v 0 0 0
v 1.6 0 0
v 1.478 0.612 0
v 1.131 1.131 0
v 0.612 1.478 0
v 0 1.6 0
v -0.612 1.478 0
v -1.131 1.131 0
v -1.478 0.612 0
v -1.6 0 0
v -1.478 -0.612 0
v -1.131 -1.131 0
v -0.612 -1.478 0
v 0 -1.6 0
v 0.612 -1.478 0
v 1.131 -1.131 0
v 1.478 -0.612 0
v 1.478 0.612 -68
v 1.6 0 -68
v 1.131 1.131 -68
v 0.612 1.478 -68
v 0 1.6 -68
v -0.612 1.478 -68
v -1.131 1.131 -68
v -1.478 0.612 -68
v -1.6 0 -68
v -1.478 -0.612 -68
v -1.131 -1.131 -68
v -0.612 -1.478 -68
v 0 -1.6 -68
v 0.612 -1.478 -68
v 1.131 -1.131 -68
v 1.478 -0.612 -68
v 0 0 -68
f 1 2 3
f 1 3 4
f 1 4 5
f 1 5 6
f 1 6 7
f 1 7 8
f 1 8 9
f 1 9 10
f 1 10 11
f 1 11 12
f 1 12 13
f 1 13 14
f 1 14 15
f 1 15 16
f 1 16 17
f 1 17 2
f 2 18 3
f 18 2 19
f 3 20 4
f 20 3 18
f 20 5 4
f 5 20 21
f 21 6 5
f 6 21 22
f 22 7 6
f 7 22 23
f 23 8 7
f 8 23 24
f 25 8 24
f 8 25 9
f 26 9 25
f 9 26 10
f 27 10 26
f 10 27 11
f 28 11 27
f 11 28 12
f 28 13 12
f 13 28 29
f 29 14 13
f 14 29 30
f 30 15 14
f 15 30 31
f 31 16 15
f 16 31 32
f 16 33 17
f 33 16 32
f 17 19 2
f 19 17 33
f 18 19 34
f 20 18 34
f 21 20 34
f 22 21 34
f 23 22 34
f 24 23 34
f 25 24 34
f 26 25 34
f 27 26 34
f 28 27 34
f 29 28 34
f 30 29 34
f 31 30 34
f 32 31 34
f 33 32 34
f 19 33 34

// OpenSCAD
// file: ../p/4-4edge.scad
use <../lib.scad>
function ldraw_lib__4_4edge() = [
// 0 Circle 1.0
// 0 Name: 4-4edge.dat
// 0 Author: James Jessiman
// 0 !LDRAW_ORG Primitive UPDATE 2017-01
// 0 !LICENSE Licensed under CC BY 2.0 and CC BY 4.0 : see CAreadme.txt
// 
// 0 BFC CERTIFY CCW
  [0,"BFC","CERTIFY"],
  [0,"BFC","CCW"],
// 
// 0 !HISTORY 1998-12-15 [PTadmin] Official Update 1998-10
// 0 !HISTORY 2005-12-28 [PTadmin] Official Update 2005-01
// 0 !HISTORY 2007-06-24 [PTadmin] Header formatted for Contributor Agreement
// 0 !HISTORY 2008-07-01 [PTadmin] Official Update 2008-01
// 0 !HISTORY 2017-01-15 [Steffen] BFCed
// 0 !HISTORY 2017-12-30 [PTadmin] Official Update 2017-01
// 
// 
// 2 24 1 0 0 0.9239 0 0.3827
  [2,24,1,0,0,0.9239,0,0.3827],
// 2 24 0.9239 0 0.3827 0.7071 0 0.7071
  [2,24,0.9239,0,0.3827,0.7071,0,0.7071],
// 2 24 0.7071 0 0.7071 0.3827 0 0.9239
  [2,24,0.7071,0,0.7071,0.3827,0,0.9239],
// 2 24 0.3827 0 0.9239 0 0 1
  [2,24,0.3827,0,0.9239,0,0,1],
// 2 24 0 0 1 -0.3827 0 0.9239
  [2,24,0,0,1,-0.3827,0,0.9239],
// 2 24 -0.3827 0 0.9239 -0.7071 0 0.7071
  [2,24,-0.3827,0,0.9239,-0.7071,0,0.7071],
// 2 24 -0.7071 0 0.7071 -0.9239 0 0.3827
  [2,24,-0.7071,0,0.7071,-0.9239,0,0.3827],
// 2 24 -0.9239 0 0.3827 -1 0 -0
  [2,24,-0.9239,0,0.3827,-1,0,-0],
// 2 24 -1 0 -0 -0.9239 0 -0.3827
  [2,24,-1,0,-0,-0.9239,0,-0.3827],
// 2 24 -0.9239 0 -0.3827 -0.7071 0 -0.7071
  [2,24,-0.9239,0,-0.3827,-0.7071,0,-0.7071],
// 2 24 -0.7071 0 -0.7071 -0.3827 0 -0.9239
  [2,24,-0.7071,0,-0.7071,-0.3827,0,-0.9239],
// 2 24 -0.3827 0 -0.9239 0 0 -1
  [2,24,-0.3827,0,-0.9239,0,0,-1],
// 2 24 0 0 -1 0.3827 0 -0.9239
  [2,24,0,0,-1,0.3827,0,-0.9239],
// 2 24 0.3827 0 -0.9239 0.7071 0 -0.7071
  [2,24,0.3827,0,-0.9239,0.7071,0,-0.7071],
// 2 24 0.7071 0 -0.7071 0.9239 0 -0.3827
  [2,24,0.7071,0,-0.7071,0.9239,0,-0.3827],
// 2 24 0.9239 0 -0.3827 1 0 0
  [2,24,0.9239,0,-0.3827,1,0,0],
];
module ldraw_lib__4_4edge(step=0, col=false, unit=2/5, alt=false, line=0.2, solid=!$preview)
    makepoly(ldraw_lib__4_4edge(), step=step, col=col, unit=unit, alt=alt, line=line, solid=solid);
ldraw_lib__4_4edge(line=0.2);
// file: ../p/4-4cyli.scad
use <../lib.scad>
function ldraw_lib__4_4cyli() = [
// 0 Cylinder 1.0
// 0 Name: 4-4cyli.dat
// 0 Author: James Jessiman
// 0 !LDRAW_ORG Primitive UPDATE 2005-01
// 0 !LICENSE Licensed under CC BY 2.0 and CC BY 4.0 : see CAreadme.txt
// 
// 0 BFC CERTIFY CCW
  [0,"BFC","CERTIFY"],
  [0,"BFC","CCW"],
// 
// 0 !HISTORY 1998-12-15 [PTadmin] Official Update 1998-10
// 0 !HISTORY 2002-03-23 [sbliss] Added BFC statement; merged headers from files in distributions LDraw 0.27 and Complete.
// 0 !HISTORY 2002-04-25 [PTadmin] Official Update 2002-02
// 0 !HISTORY 2004-12-14 [guyvivan] BFC CCW
// 0 !HISTORY 2005-12-28 [PTadmin] Official Update 2005-01
// 0 !HISTORY 2007-06-24 [PTadmin] Header formatted for Contributor Agreement
// 0 !HISTORY 2008-07-01 [PTadmin] Official Update 2008-01
// 
// 
// 4 16 1 1 0 0.9239 1 0.3827 0.9239 0 0.3827 1 0 0
  [4,16,1,1,0,0.9239,1,0.3827,0.9239,0,0.3827,1,0,0],
// 5 24 1 0 0 1 1 0 0.9239 0 0.3827 0.9239 0 -0.3827
  [5,24,1,0,0,1,1,0,0.9239,0,0.3827,0.9239,0,-0.3827],
// 4 16 0.9239 1 0.3827 0.7071 1 0.7071 0.7071 0 0.7071 0.9239 0 0.3827
  [4,16,0.9239,1,0.3827,0.7071,1,0.7071,0.7071,0,0.7071,0.9239,0,0.3827],
// 5 24 0.9239 0 0.3827 0.9239 1 0.3827 0.7071 0 0.7071 1 0 0
  [5,24,0.9239,0,0.3827,0.9239,1,0.3827,0.7071,0,0.7071,1,0,0],
// 4 16 0.7071 1 0.7071 0.3827 1 0.9239 0.3827 0 0.9239 0.7071 0 0.7071
  [4,16,0.7071,1,0.7071,0.3827,1,0.9239,0.3827,0,0.9239,0.7071,0,0.7071],
// 5 24 0.7071 0 0.7071 0.7071 1 0.7071 0.3827 0 0.9239 0.9239 0 0.3827
  [5,24,0.7071,0,0.7071,0.7071,1,0.7071,0.3827,0,0.9239,0.9239,0,0.3827],
// 4 16 0.3827 1 0.9239 0 1 1 0 0 1 0.3827 0 0.9239
  [4,16,0.3827,1,0.9239,0,1,1,0,0,1,0.3827,0,0.9239],
// 5 24 0.3827 0 0.9239 0.3827 1 0.9239 0 0 1 0.7071 0 0.7071
  [5,24,0.3827,0,0.9239,0.3827,1,0.9239,0,0,1,0.7071,0,0.7071],
// 4 16 0 1 1 -0.3827 1 0.9239 -0.3827 0 0.9239 0 0 1
  [4,16,0,1,1,-0.3827,1,0.9239,-0.3827,0,0.9239,0,0,1],
// 5 24 0 0 1 0 1 1 -0.3827 0 0.9239 0.3827 0 0.9239
  [5,24,0,0,1,0,1,1,-0.3827,0,0.9239,0.3827,0,0.9239],
// 4 16 -0.3827 1 0.9239 -0.7071 1 0.7071 -0.7071 0 0.7071 -0.3827 0 0.9239
  [4,16,-0.3827,1,0.9239,-0.7071,1,0.7071,-0.7071,0,0.7071,-0.3827,0,0.9239],
// 5 24 -0.3827 0 0.9239 -0.3827 1 0.9239 -0.7071 0 0.7071 0 0 1
  [5,24,-0.3827,0,0.9239,-0.3827,1,0.9239,-0.7071,0,0.7071,0,0,1],
// 4 16 -0.7071 1 0.7071 -0.9239 1 0.3827 -0.9239 0 0.3827 -0.7071 0 0.7071
  [4,16,-0.7071,1,0.7071,-0.9239,1,0.3827,-0.9239,0,0.3827,-0.7071,0,0.7071],
// 5 24 -0.7071 0 0.7071 -0.7071 1 0.7071 -0.9239 0 0.3827 -0.3827 0 0.9239
  [5,24,-0.7071,0,0.7071,-0.7071,1,0.7071,-0.9239,0,0.3827,-0.3827,0,0.9239],
// 4 16 -0.9239 1 0.3827 -1 1 0 -1 0 0 -0.9239 0 0.3827
  [4,16,-0.9239,1,0.3827,-1,1,0,-1,0,0,-0.9239,0,0.3827],
// 5 24 -0.9239 0 0.3827 -0.9239 1 0.3827 -1 0 0 -0.7071 0 0.7071
  [5,24,-0.9239,0,0.3827,-0.9239,1,0.3827,-1,0,0,-0.7071,0,0.7071],
// 4 16 -1 1 0 -0.9239 1 -0.3827 -0.9239 0 -0.3827 -1 0 0
  [4,16,-1,1,0,-0.9239,1,-0.3827,-0.9239,0,-0.3827,-1,0,0],
// 5 24 -1 0 0 -1 1 0 -0.9239 0 -0.3827 -0.9239 0 0.3827
  [5,24,-1,0,0,-1,1,0,-0.9239,0,-0.3827,-0.9239,0,0.3827],
// 4 16 -0.9239 1 -0.3827 -0.7071 1 -0.7071 -0.7071 0 -0.7071 -0.9239 0 -0.3827
  [4,16,-0.9239,1,-0.3827,-0.7071,1,-0.7071,-0.7071,0,-0.7071,-0.9239,0,-0.3827],
// 5 24 -0.9239 0 -0.3827 -0.9239 1 -0.3827 -0.7071 0 -0.7071 -1 0 0
  [5,24,-0.9239,0,-0.3827,-0.9239,1,-0.3827,-0.7071,0,-0.7071,-1,0,0],
// 4 16 -0.7071 1 -0.7071 -0.3827 1 -0.9239 -0.3827 0 -0.9239 -0.7071 0 -0.7071
  [4,16,-0.7071,1,-0.7071,-0.3827,1,-0.9239,-0.3827,0,-0.9239,-0.7071,0,-0.7071],
// 5 24 -0.7071 0 -0.7071 -0.7071 1 -0.7071 -0.3827 0 -0.9239 -0.9239 0 -0.3827
  [5,24,-0.7071,0,-0.7071,-0.7071,1,-0.7071,-0.3827,0,-0.9239,-0.9239,0,-0.3827],
// 4 16 -0.3827 1 -0.9239 0 1 -1 0 0 -1 -0.3827 0 -0.9239
  [4,16,-0.3827,1,-0.9239,0,1,-1,0,0,-1,-0.3827,0,-0.9239],
// 5 24 -0.3827 0 -0.9239 -0.3827 1 -0.9239 0 0 -1 -0.7071 0 -0.7071
  [5,24,-0.3827,0,-0.9239,-0.3827,1,-0.9239,0,0,-1,-0.7071,0,-0.7071],
// 4 16 0 1 -1 0.3827 1 -0.9239 0.3827 0 -0.9239 0 0 -1
  [4,16,0,1,-1,0.3827,1,-0.9239,0.3827,0,-0.9239,0,0,-1],
// 5 24 0 0 -1 0 1 -1 0.3827 0 -0.9239 -0.3827 0 -0.9239
  [5,24,0,0,-1,0,1,-1,0.3827,0,-0.9239,-0.3827,0,-0.9239],
// 4 16 0.3827 1 -0.9239 0.7071 1 -0.7071 0.7071 0 -0.7071 0.3827 0 -0.9239
  [4,16,0.3827,1,-0.9239,0.7071,1,-0.7071,0.7071,0,-0.7071,0.3827,0,-0.9239],
// 5 24 0.3827 0 -0.9239 0.3827 1 -0.9239 0.7071 0 -0.7071 0 0 -1
  [5,24,0.3827,0,-0.9239,0.3827,1,-0.9239,0.7071,0,-0.7071,0,0,-1],
// 4 16 0.7071 1 -0.7071 0.9239 1 -0.3827 0.9239 0 -0.3827 0.7071 0 -0.7071
  [4,16,0.7071,1,-0.7071,0.9239,1,-0.3827,0.9239,0,-0.3827,0.7071,0,-0.7071],
// 5 24 0.7071 0 -0.7071 0.7071 1 -0.7071 0.9239 0 -0.3827 0.3827 0 -0.9239
  [5,24,0.7071,0,-0.7071,0.7071,1,-0.7071,0.9239,0,-0.3827,0.3827,0,-0.9239],
// 4 16 0.9239 1 -0.3827 1 1 0 1 0 0 0.9239 0 -0.3827
  [4,16,0.9239,1,-0.3827,1,1,0,1,0,0,0.9239,0,-0.3827],
// 5 24 0.9239 0 -0.3827 0.9239 1 -0.3827 1 0 0 0.7071 0 -0.7071
  [5,24,0.9239,0,-0.3827,0.9239,1,-0.3827,1,0,0,0.7071,0,-0.7071],
// 0
];
module ldraw_lib__4_4cyli(step=0, col=false, unit=2/5, alt=false, line=0.2, solid=!$preview)
    makepoly(ldraw_lib__4_4cyli(), step=step, col=col, unit=unit, alt=alt, line=line, solid=solid);
ldraw_lib__4_4cyli(line=0.2);
// file: ../p/4-4disc.scad
use <../lib.scad>
function ldraw_lib__4_4disc() = [
// 0 Disc 1.0
// 0 Name: 4-4disc.dat
// 0 Author: James Jessiman
// 0 !LDRAW_ORG Primitive UPDATE 2002-02
// 0 !LICENSE Licensed under CC BY 2.0 and CC BY 4.0 : see CAreadme.txt
// 
// 0 BFC CERTIFY CCW
  [0,"BFC","CERTIFY"],
  [0,"BFC","CCW"],
// 
// 0 !HISTORY 1998-12-15 [PTadmin] Official Update 1998-10
// 0 !HISTORY 2002-03-23 [sbliss] Added BFC statement
// 0 !HISTORY 2002-04-25 [PTadmin] Official Update 2002-02
// 0 !HISTORY 2007-06-24 [PTadmin] Header formatted for Contributor Agreement
// 0 !HISTORY 2008-07-01 [PTadmin] Official Update 2008-01
// 
// 
// 3 16 0 0 0 1 0 0 0.9239 0 0.3827
  [3,16,0,0,0,1,0,0,0.9239,0,0.3827],
// 3 16 0 0 0 0.9239 0 0.3827 0.7071 0 0.7071
  [3,16,0,0,0,0.9239,0,0.3827,0.7071,0,0.7071],
// 3 16 0 0 0 0.7071 0 0.7071 0.3827 0 0.9239
  [3,16,0,0,0,0.7071,0,0.7071,0.3827,0,0.9239],
// 3 16 0 0 0 0.3827 0 0.9239 0 0 1
  [3,16,0,0,0,0.3827,0,0.9239,0,0,1],
// 3 16 0 0 0 0 0 1 -0.3827 0 0.9239
  [3,16,0,0,0,0,0,1,-0.3827,0,0.9239],
// 3 16 0 0 0 -0.3827 0 0.9239 -0.7071 0 0.7071
  [3,16,0,0,0,-0.3827,0,0.9239,-0.7071,0,0.7071],
// 3 16 0 0 0 -0.7071 0 0.7071 -0.9239 0 0.3827
  [3,16,0,0,0,-0.7071,0,0.7071,-0.9239,0,0.3827],
// 3 16 0 0 0 -0.9239 0 0.3827 -1 0 -0
  [3,16,0,0,0,-0.9239,0,0.3827,-1,0,-0],
// 3 16 0 0 0 -1 0 -0 -0.9239 0 -0.3827
  [3,16,0,0,0,-1,0,-0,-0.9239,0,-0.3827],
// 3 16 0 0 0 -0.9239 0 -0.3827 -0.7071 0 -0.7071
  [3,16,0,0,0,-0.9239,0,-0.3827,-0.7071,0,-0.7071],
// 3 16 0 0 0 -0.7071 0 -0.7071 -0.3827 0 -0.9239
  [3,16,0,0,0,-0.7071,0,-0.7071,-0.3827,0,-0.9239],
// 3 16 0 0 0 -0.3827 0 -0.9239 0 0 -1
  [3,16,0,0,0,-0.3827,0,-0.9239,0,0,-1],
// 3 16 0 0 0 0 0 -1 0.3827 0 -0.9239
  [3,16,0,0,0,0,0,-1,0.3827,0,-0.9239],
// 3 16 0 0 0 0.3827 0 -0.9239 0.7071 0 -0.7071
  [3,16,0,0,0,0.3827,0,-0.9239,0.7071,0,-0.7071],
// 3 16 0 0 0 0.7071 0 -0.7071 0.9239 0 -0.3827
  [3,16,0,0,0,0.7071,0,-0.7071,0.9239,0,-0.3827],
// 3 16 0 0 0 0.9239 0 -0.3827 1 0 0
  [3,16,0,0,0,0.9239,0,-0.3827,1,0,0],
// 0
];
module ldraw_lib__4_4disc(step=0, col=false, unit=2/5, alt=false, line=0.2, solid=!$preview)
    makepoly(ldraw_lib__4_4disc(), step=step, col=col, unit=unit, alt=alt, line=line, solid=solid);
ldraw_lib__4_4disc(line=0.2);
// file: ../p/4-4cylc.scad
use <../lib.scad>
use <4-4cyli.scad>
use <4-4disc.scad>
use <4-4edge.scad>
function ldraw_lib__4_4cylc() = [
// 0 Cylinder Closed 1.0
// 0 Name: 4-4cylc.dat
// 0 Author: Alex Taylor [anathema]
// 0 !LDRAW_ORG Primitive UPDATE 2009-02
// 0 !LICENSE Licensed under CC BY 2.0 and CC BY 4.0 : see CAreadme.txt
// 
// 0 BFC CERTIFY CCW
  [0,"BFC","CERTIFY"],
  [0,"BFC","CCW"],
// 
// 0 !HISTORY 2008-12-29 [cwdee] Removed one disc
// 0 !HISTORY 2009-09-03 [PTadmin] Official Update 2009-02
// 
// 
// 1 16 0 0 0 1 0 0 0 1 0 0 0 1 4-4edge.dat
  [1,16,0,0,0,1,0,0,0,1,0,0,0,1, ldraw_lib__4_4edge()],
// 1 16 0 1 0 1 0 0 0 1 0 0 0 1 4-4edge.dat
  [1,16,0,1,0,1,0,0,0,1,0,0,0,1, ldraw_lib__4_4edge()],
// 1 16 0 0 0 1 0 0 0 1 0 0 0 1 4-4disc.dat
  [1,16,0,0,0,1,0,0,0,1,0,0,0,1, ldraw_lib__4_4disc()],
// 1 16 0 0 0 1 0 0 0 1 0 0 0 1 4-4cyli.dat
  [1,16,0,0,0,1,0,0,0,1,0,0,0,1, ldraw_lib__4_4cyli()],
// 0
];
module ldraw_lib__4_4cylc(step=0, col=false, unit=2/5, alt=false, line=0.2, solid=!$preview)
    makepoly(ldraw_lib__4_4cylc(), step=step, col=col, unit=unit, alt=alt, line=line, solid=solid);
ldraw_lib__4_4cylc(line=0.2);
// main file
use <../lib.scad>
use <../p/4-4cylc.scad>
use <../p/4-4disc.scad>
function ldraw_lib__u9112() = [
// 0 ~Technic Pneumatic Cylinder  1 x 11 Piston Rod
// 0 Name: u9112.dat
// 0 Author: Philippe Hurbain [Philo]
// 0 !LDRAW_ORG Part UPDATE 2018-01
// 0 !LICENSE Licensed under CC BY 2.0 and CC BY 4.0 : see CAreadme.txt
// 
// 0 BFC CERTIFY CCW
  [0,"BFC","CERTIFY"],
  [0,"BFC","CCW"],
// 
// 0 !HISTORY 2018-01-30 [PTadmin] Official Update 2018-01
// 
// 
// 1 16 0 0 0 4 0 0 0 170 0 0 0 4 4-4cylc.dat
  [1,16,0,0,0,4,0,0,0,170,0,0,0,4, ldraw_lib__4_4cylc()],
// 1 16 0 170 0 4 0 0 0 -1 0 0 0 4 4-4disc.dat
  [1,16,0,170,0,4,0,0,0,-1,0,0,0,4, ldraw_lib__4_4disc()],
];
module ldraw_lib__u9112(step=0, col=false, unit=2/5, alt=false, line=0.2, solid=!$preview)
    makepoly(ldraw_lib__u9112(), step=step, col=col, unit=unit, alt=alt, line=line, solid=solid);
ldraw_lib__u9112(line=0.2);
